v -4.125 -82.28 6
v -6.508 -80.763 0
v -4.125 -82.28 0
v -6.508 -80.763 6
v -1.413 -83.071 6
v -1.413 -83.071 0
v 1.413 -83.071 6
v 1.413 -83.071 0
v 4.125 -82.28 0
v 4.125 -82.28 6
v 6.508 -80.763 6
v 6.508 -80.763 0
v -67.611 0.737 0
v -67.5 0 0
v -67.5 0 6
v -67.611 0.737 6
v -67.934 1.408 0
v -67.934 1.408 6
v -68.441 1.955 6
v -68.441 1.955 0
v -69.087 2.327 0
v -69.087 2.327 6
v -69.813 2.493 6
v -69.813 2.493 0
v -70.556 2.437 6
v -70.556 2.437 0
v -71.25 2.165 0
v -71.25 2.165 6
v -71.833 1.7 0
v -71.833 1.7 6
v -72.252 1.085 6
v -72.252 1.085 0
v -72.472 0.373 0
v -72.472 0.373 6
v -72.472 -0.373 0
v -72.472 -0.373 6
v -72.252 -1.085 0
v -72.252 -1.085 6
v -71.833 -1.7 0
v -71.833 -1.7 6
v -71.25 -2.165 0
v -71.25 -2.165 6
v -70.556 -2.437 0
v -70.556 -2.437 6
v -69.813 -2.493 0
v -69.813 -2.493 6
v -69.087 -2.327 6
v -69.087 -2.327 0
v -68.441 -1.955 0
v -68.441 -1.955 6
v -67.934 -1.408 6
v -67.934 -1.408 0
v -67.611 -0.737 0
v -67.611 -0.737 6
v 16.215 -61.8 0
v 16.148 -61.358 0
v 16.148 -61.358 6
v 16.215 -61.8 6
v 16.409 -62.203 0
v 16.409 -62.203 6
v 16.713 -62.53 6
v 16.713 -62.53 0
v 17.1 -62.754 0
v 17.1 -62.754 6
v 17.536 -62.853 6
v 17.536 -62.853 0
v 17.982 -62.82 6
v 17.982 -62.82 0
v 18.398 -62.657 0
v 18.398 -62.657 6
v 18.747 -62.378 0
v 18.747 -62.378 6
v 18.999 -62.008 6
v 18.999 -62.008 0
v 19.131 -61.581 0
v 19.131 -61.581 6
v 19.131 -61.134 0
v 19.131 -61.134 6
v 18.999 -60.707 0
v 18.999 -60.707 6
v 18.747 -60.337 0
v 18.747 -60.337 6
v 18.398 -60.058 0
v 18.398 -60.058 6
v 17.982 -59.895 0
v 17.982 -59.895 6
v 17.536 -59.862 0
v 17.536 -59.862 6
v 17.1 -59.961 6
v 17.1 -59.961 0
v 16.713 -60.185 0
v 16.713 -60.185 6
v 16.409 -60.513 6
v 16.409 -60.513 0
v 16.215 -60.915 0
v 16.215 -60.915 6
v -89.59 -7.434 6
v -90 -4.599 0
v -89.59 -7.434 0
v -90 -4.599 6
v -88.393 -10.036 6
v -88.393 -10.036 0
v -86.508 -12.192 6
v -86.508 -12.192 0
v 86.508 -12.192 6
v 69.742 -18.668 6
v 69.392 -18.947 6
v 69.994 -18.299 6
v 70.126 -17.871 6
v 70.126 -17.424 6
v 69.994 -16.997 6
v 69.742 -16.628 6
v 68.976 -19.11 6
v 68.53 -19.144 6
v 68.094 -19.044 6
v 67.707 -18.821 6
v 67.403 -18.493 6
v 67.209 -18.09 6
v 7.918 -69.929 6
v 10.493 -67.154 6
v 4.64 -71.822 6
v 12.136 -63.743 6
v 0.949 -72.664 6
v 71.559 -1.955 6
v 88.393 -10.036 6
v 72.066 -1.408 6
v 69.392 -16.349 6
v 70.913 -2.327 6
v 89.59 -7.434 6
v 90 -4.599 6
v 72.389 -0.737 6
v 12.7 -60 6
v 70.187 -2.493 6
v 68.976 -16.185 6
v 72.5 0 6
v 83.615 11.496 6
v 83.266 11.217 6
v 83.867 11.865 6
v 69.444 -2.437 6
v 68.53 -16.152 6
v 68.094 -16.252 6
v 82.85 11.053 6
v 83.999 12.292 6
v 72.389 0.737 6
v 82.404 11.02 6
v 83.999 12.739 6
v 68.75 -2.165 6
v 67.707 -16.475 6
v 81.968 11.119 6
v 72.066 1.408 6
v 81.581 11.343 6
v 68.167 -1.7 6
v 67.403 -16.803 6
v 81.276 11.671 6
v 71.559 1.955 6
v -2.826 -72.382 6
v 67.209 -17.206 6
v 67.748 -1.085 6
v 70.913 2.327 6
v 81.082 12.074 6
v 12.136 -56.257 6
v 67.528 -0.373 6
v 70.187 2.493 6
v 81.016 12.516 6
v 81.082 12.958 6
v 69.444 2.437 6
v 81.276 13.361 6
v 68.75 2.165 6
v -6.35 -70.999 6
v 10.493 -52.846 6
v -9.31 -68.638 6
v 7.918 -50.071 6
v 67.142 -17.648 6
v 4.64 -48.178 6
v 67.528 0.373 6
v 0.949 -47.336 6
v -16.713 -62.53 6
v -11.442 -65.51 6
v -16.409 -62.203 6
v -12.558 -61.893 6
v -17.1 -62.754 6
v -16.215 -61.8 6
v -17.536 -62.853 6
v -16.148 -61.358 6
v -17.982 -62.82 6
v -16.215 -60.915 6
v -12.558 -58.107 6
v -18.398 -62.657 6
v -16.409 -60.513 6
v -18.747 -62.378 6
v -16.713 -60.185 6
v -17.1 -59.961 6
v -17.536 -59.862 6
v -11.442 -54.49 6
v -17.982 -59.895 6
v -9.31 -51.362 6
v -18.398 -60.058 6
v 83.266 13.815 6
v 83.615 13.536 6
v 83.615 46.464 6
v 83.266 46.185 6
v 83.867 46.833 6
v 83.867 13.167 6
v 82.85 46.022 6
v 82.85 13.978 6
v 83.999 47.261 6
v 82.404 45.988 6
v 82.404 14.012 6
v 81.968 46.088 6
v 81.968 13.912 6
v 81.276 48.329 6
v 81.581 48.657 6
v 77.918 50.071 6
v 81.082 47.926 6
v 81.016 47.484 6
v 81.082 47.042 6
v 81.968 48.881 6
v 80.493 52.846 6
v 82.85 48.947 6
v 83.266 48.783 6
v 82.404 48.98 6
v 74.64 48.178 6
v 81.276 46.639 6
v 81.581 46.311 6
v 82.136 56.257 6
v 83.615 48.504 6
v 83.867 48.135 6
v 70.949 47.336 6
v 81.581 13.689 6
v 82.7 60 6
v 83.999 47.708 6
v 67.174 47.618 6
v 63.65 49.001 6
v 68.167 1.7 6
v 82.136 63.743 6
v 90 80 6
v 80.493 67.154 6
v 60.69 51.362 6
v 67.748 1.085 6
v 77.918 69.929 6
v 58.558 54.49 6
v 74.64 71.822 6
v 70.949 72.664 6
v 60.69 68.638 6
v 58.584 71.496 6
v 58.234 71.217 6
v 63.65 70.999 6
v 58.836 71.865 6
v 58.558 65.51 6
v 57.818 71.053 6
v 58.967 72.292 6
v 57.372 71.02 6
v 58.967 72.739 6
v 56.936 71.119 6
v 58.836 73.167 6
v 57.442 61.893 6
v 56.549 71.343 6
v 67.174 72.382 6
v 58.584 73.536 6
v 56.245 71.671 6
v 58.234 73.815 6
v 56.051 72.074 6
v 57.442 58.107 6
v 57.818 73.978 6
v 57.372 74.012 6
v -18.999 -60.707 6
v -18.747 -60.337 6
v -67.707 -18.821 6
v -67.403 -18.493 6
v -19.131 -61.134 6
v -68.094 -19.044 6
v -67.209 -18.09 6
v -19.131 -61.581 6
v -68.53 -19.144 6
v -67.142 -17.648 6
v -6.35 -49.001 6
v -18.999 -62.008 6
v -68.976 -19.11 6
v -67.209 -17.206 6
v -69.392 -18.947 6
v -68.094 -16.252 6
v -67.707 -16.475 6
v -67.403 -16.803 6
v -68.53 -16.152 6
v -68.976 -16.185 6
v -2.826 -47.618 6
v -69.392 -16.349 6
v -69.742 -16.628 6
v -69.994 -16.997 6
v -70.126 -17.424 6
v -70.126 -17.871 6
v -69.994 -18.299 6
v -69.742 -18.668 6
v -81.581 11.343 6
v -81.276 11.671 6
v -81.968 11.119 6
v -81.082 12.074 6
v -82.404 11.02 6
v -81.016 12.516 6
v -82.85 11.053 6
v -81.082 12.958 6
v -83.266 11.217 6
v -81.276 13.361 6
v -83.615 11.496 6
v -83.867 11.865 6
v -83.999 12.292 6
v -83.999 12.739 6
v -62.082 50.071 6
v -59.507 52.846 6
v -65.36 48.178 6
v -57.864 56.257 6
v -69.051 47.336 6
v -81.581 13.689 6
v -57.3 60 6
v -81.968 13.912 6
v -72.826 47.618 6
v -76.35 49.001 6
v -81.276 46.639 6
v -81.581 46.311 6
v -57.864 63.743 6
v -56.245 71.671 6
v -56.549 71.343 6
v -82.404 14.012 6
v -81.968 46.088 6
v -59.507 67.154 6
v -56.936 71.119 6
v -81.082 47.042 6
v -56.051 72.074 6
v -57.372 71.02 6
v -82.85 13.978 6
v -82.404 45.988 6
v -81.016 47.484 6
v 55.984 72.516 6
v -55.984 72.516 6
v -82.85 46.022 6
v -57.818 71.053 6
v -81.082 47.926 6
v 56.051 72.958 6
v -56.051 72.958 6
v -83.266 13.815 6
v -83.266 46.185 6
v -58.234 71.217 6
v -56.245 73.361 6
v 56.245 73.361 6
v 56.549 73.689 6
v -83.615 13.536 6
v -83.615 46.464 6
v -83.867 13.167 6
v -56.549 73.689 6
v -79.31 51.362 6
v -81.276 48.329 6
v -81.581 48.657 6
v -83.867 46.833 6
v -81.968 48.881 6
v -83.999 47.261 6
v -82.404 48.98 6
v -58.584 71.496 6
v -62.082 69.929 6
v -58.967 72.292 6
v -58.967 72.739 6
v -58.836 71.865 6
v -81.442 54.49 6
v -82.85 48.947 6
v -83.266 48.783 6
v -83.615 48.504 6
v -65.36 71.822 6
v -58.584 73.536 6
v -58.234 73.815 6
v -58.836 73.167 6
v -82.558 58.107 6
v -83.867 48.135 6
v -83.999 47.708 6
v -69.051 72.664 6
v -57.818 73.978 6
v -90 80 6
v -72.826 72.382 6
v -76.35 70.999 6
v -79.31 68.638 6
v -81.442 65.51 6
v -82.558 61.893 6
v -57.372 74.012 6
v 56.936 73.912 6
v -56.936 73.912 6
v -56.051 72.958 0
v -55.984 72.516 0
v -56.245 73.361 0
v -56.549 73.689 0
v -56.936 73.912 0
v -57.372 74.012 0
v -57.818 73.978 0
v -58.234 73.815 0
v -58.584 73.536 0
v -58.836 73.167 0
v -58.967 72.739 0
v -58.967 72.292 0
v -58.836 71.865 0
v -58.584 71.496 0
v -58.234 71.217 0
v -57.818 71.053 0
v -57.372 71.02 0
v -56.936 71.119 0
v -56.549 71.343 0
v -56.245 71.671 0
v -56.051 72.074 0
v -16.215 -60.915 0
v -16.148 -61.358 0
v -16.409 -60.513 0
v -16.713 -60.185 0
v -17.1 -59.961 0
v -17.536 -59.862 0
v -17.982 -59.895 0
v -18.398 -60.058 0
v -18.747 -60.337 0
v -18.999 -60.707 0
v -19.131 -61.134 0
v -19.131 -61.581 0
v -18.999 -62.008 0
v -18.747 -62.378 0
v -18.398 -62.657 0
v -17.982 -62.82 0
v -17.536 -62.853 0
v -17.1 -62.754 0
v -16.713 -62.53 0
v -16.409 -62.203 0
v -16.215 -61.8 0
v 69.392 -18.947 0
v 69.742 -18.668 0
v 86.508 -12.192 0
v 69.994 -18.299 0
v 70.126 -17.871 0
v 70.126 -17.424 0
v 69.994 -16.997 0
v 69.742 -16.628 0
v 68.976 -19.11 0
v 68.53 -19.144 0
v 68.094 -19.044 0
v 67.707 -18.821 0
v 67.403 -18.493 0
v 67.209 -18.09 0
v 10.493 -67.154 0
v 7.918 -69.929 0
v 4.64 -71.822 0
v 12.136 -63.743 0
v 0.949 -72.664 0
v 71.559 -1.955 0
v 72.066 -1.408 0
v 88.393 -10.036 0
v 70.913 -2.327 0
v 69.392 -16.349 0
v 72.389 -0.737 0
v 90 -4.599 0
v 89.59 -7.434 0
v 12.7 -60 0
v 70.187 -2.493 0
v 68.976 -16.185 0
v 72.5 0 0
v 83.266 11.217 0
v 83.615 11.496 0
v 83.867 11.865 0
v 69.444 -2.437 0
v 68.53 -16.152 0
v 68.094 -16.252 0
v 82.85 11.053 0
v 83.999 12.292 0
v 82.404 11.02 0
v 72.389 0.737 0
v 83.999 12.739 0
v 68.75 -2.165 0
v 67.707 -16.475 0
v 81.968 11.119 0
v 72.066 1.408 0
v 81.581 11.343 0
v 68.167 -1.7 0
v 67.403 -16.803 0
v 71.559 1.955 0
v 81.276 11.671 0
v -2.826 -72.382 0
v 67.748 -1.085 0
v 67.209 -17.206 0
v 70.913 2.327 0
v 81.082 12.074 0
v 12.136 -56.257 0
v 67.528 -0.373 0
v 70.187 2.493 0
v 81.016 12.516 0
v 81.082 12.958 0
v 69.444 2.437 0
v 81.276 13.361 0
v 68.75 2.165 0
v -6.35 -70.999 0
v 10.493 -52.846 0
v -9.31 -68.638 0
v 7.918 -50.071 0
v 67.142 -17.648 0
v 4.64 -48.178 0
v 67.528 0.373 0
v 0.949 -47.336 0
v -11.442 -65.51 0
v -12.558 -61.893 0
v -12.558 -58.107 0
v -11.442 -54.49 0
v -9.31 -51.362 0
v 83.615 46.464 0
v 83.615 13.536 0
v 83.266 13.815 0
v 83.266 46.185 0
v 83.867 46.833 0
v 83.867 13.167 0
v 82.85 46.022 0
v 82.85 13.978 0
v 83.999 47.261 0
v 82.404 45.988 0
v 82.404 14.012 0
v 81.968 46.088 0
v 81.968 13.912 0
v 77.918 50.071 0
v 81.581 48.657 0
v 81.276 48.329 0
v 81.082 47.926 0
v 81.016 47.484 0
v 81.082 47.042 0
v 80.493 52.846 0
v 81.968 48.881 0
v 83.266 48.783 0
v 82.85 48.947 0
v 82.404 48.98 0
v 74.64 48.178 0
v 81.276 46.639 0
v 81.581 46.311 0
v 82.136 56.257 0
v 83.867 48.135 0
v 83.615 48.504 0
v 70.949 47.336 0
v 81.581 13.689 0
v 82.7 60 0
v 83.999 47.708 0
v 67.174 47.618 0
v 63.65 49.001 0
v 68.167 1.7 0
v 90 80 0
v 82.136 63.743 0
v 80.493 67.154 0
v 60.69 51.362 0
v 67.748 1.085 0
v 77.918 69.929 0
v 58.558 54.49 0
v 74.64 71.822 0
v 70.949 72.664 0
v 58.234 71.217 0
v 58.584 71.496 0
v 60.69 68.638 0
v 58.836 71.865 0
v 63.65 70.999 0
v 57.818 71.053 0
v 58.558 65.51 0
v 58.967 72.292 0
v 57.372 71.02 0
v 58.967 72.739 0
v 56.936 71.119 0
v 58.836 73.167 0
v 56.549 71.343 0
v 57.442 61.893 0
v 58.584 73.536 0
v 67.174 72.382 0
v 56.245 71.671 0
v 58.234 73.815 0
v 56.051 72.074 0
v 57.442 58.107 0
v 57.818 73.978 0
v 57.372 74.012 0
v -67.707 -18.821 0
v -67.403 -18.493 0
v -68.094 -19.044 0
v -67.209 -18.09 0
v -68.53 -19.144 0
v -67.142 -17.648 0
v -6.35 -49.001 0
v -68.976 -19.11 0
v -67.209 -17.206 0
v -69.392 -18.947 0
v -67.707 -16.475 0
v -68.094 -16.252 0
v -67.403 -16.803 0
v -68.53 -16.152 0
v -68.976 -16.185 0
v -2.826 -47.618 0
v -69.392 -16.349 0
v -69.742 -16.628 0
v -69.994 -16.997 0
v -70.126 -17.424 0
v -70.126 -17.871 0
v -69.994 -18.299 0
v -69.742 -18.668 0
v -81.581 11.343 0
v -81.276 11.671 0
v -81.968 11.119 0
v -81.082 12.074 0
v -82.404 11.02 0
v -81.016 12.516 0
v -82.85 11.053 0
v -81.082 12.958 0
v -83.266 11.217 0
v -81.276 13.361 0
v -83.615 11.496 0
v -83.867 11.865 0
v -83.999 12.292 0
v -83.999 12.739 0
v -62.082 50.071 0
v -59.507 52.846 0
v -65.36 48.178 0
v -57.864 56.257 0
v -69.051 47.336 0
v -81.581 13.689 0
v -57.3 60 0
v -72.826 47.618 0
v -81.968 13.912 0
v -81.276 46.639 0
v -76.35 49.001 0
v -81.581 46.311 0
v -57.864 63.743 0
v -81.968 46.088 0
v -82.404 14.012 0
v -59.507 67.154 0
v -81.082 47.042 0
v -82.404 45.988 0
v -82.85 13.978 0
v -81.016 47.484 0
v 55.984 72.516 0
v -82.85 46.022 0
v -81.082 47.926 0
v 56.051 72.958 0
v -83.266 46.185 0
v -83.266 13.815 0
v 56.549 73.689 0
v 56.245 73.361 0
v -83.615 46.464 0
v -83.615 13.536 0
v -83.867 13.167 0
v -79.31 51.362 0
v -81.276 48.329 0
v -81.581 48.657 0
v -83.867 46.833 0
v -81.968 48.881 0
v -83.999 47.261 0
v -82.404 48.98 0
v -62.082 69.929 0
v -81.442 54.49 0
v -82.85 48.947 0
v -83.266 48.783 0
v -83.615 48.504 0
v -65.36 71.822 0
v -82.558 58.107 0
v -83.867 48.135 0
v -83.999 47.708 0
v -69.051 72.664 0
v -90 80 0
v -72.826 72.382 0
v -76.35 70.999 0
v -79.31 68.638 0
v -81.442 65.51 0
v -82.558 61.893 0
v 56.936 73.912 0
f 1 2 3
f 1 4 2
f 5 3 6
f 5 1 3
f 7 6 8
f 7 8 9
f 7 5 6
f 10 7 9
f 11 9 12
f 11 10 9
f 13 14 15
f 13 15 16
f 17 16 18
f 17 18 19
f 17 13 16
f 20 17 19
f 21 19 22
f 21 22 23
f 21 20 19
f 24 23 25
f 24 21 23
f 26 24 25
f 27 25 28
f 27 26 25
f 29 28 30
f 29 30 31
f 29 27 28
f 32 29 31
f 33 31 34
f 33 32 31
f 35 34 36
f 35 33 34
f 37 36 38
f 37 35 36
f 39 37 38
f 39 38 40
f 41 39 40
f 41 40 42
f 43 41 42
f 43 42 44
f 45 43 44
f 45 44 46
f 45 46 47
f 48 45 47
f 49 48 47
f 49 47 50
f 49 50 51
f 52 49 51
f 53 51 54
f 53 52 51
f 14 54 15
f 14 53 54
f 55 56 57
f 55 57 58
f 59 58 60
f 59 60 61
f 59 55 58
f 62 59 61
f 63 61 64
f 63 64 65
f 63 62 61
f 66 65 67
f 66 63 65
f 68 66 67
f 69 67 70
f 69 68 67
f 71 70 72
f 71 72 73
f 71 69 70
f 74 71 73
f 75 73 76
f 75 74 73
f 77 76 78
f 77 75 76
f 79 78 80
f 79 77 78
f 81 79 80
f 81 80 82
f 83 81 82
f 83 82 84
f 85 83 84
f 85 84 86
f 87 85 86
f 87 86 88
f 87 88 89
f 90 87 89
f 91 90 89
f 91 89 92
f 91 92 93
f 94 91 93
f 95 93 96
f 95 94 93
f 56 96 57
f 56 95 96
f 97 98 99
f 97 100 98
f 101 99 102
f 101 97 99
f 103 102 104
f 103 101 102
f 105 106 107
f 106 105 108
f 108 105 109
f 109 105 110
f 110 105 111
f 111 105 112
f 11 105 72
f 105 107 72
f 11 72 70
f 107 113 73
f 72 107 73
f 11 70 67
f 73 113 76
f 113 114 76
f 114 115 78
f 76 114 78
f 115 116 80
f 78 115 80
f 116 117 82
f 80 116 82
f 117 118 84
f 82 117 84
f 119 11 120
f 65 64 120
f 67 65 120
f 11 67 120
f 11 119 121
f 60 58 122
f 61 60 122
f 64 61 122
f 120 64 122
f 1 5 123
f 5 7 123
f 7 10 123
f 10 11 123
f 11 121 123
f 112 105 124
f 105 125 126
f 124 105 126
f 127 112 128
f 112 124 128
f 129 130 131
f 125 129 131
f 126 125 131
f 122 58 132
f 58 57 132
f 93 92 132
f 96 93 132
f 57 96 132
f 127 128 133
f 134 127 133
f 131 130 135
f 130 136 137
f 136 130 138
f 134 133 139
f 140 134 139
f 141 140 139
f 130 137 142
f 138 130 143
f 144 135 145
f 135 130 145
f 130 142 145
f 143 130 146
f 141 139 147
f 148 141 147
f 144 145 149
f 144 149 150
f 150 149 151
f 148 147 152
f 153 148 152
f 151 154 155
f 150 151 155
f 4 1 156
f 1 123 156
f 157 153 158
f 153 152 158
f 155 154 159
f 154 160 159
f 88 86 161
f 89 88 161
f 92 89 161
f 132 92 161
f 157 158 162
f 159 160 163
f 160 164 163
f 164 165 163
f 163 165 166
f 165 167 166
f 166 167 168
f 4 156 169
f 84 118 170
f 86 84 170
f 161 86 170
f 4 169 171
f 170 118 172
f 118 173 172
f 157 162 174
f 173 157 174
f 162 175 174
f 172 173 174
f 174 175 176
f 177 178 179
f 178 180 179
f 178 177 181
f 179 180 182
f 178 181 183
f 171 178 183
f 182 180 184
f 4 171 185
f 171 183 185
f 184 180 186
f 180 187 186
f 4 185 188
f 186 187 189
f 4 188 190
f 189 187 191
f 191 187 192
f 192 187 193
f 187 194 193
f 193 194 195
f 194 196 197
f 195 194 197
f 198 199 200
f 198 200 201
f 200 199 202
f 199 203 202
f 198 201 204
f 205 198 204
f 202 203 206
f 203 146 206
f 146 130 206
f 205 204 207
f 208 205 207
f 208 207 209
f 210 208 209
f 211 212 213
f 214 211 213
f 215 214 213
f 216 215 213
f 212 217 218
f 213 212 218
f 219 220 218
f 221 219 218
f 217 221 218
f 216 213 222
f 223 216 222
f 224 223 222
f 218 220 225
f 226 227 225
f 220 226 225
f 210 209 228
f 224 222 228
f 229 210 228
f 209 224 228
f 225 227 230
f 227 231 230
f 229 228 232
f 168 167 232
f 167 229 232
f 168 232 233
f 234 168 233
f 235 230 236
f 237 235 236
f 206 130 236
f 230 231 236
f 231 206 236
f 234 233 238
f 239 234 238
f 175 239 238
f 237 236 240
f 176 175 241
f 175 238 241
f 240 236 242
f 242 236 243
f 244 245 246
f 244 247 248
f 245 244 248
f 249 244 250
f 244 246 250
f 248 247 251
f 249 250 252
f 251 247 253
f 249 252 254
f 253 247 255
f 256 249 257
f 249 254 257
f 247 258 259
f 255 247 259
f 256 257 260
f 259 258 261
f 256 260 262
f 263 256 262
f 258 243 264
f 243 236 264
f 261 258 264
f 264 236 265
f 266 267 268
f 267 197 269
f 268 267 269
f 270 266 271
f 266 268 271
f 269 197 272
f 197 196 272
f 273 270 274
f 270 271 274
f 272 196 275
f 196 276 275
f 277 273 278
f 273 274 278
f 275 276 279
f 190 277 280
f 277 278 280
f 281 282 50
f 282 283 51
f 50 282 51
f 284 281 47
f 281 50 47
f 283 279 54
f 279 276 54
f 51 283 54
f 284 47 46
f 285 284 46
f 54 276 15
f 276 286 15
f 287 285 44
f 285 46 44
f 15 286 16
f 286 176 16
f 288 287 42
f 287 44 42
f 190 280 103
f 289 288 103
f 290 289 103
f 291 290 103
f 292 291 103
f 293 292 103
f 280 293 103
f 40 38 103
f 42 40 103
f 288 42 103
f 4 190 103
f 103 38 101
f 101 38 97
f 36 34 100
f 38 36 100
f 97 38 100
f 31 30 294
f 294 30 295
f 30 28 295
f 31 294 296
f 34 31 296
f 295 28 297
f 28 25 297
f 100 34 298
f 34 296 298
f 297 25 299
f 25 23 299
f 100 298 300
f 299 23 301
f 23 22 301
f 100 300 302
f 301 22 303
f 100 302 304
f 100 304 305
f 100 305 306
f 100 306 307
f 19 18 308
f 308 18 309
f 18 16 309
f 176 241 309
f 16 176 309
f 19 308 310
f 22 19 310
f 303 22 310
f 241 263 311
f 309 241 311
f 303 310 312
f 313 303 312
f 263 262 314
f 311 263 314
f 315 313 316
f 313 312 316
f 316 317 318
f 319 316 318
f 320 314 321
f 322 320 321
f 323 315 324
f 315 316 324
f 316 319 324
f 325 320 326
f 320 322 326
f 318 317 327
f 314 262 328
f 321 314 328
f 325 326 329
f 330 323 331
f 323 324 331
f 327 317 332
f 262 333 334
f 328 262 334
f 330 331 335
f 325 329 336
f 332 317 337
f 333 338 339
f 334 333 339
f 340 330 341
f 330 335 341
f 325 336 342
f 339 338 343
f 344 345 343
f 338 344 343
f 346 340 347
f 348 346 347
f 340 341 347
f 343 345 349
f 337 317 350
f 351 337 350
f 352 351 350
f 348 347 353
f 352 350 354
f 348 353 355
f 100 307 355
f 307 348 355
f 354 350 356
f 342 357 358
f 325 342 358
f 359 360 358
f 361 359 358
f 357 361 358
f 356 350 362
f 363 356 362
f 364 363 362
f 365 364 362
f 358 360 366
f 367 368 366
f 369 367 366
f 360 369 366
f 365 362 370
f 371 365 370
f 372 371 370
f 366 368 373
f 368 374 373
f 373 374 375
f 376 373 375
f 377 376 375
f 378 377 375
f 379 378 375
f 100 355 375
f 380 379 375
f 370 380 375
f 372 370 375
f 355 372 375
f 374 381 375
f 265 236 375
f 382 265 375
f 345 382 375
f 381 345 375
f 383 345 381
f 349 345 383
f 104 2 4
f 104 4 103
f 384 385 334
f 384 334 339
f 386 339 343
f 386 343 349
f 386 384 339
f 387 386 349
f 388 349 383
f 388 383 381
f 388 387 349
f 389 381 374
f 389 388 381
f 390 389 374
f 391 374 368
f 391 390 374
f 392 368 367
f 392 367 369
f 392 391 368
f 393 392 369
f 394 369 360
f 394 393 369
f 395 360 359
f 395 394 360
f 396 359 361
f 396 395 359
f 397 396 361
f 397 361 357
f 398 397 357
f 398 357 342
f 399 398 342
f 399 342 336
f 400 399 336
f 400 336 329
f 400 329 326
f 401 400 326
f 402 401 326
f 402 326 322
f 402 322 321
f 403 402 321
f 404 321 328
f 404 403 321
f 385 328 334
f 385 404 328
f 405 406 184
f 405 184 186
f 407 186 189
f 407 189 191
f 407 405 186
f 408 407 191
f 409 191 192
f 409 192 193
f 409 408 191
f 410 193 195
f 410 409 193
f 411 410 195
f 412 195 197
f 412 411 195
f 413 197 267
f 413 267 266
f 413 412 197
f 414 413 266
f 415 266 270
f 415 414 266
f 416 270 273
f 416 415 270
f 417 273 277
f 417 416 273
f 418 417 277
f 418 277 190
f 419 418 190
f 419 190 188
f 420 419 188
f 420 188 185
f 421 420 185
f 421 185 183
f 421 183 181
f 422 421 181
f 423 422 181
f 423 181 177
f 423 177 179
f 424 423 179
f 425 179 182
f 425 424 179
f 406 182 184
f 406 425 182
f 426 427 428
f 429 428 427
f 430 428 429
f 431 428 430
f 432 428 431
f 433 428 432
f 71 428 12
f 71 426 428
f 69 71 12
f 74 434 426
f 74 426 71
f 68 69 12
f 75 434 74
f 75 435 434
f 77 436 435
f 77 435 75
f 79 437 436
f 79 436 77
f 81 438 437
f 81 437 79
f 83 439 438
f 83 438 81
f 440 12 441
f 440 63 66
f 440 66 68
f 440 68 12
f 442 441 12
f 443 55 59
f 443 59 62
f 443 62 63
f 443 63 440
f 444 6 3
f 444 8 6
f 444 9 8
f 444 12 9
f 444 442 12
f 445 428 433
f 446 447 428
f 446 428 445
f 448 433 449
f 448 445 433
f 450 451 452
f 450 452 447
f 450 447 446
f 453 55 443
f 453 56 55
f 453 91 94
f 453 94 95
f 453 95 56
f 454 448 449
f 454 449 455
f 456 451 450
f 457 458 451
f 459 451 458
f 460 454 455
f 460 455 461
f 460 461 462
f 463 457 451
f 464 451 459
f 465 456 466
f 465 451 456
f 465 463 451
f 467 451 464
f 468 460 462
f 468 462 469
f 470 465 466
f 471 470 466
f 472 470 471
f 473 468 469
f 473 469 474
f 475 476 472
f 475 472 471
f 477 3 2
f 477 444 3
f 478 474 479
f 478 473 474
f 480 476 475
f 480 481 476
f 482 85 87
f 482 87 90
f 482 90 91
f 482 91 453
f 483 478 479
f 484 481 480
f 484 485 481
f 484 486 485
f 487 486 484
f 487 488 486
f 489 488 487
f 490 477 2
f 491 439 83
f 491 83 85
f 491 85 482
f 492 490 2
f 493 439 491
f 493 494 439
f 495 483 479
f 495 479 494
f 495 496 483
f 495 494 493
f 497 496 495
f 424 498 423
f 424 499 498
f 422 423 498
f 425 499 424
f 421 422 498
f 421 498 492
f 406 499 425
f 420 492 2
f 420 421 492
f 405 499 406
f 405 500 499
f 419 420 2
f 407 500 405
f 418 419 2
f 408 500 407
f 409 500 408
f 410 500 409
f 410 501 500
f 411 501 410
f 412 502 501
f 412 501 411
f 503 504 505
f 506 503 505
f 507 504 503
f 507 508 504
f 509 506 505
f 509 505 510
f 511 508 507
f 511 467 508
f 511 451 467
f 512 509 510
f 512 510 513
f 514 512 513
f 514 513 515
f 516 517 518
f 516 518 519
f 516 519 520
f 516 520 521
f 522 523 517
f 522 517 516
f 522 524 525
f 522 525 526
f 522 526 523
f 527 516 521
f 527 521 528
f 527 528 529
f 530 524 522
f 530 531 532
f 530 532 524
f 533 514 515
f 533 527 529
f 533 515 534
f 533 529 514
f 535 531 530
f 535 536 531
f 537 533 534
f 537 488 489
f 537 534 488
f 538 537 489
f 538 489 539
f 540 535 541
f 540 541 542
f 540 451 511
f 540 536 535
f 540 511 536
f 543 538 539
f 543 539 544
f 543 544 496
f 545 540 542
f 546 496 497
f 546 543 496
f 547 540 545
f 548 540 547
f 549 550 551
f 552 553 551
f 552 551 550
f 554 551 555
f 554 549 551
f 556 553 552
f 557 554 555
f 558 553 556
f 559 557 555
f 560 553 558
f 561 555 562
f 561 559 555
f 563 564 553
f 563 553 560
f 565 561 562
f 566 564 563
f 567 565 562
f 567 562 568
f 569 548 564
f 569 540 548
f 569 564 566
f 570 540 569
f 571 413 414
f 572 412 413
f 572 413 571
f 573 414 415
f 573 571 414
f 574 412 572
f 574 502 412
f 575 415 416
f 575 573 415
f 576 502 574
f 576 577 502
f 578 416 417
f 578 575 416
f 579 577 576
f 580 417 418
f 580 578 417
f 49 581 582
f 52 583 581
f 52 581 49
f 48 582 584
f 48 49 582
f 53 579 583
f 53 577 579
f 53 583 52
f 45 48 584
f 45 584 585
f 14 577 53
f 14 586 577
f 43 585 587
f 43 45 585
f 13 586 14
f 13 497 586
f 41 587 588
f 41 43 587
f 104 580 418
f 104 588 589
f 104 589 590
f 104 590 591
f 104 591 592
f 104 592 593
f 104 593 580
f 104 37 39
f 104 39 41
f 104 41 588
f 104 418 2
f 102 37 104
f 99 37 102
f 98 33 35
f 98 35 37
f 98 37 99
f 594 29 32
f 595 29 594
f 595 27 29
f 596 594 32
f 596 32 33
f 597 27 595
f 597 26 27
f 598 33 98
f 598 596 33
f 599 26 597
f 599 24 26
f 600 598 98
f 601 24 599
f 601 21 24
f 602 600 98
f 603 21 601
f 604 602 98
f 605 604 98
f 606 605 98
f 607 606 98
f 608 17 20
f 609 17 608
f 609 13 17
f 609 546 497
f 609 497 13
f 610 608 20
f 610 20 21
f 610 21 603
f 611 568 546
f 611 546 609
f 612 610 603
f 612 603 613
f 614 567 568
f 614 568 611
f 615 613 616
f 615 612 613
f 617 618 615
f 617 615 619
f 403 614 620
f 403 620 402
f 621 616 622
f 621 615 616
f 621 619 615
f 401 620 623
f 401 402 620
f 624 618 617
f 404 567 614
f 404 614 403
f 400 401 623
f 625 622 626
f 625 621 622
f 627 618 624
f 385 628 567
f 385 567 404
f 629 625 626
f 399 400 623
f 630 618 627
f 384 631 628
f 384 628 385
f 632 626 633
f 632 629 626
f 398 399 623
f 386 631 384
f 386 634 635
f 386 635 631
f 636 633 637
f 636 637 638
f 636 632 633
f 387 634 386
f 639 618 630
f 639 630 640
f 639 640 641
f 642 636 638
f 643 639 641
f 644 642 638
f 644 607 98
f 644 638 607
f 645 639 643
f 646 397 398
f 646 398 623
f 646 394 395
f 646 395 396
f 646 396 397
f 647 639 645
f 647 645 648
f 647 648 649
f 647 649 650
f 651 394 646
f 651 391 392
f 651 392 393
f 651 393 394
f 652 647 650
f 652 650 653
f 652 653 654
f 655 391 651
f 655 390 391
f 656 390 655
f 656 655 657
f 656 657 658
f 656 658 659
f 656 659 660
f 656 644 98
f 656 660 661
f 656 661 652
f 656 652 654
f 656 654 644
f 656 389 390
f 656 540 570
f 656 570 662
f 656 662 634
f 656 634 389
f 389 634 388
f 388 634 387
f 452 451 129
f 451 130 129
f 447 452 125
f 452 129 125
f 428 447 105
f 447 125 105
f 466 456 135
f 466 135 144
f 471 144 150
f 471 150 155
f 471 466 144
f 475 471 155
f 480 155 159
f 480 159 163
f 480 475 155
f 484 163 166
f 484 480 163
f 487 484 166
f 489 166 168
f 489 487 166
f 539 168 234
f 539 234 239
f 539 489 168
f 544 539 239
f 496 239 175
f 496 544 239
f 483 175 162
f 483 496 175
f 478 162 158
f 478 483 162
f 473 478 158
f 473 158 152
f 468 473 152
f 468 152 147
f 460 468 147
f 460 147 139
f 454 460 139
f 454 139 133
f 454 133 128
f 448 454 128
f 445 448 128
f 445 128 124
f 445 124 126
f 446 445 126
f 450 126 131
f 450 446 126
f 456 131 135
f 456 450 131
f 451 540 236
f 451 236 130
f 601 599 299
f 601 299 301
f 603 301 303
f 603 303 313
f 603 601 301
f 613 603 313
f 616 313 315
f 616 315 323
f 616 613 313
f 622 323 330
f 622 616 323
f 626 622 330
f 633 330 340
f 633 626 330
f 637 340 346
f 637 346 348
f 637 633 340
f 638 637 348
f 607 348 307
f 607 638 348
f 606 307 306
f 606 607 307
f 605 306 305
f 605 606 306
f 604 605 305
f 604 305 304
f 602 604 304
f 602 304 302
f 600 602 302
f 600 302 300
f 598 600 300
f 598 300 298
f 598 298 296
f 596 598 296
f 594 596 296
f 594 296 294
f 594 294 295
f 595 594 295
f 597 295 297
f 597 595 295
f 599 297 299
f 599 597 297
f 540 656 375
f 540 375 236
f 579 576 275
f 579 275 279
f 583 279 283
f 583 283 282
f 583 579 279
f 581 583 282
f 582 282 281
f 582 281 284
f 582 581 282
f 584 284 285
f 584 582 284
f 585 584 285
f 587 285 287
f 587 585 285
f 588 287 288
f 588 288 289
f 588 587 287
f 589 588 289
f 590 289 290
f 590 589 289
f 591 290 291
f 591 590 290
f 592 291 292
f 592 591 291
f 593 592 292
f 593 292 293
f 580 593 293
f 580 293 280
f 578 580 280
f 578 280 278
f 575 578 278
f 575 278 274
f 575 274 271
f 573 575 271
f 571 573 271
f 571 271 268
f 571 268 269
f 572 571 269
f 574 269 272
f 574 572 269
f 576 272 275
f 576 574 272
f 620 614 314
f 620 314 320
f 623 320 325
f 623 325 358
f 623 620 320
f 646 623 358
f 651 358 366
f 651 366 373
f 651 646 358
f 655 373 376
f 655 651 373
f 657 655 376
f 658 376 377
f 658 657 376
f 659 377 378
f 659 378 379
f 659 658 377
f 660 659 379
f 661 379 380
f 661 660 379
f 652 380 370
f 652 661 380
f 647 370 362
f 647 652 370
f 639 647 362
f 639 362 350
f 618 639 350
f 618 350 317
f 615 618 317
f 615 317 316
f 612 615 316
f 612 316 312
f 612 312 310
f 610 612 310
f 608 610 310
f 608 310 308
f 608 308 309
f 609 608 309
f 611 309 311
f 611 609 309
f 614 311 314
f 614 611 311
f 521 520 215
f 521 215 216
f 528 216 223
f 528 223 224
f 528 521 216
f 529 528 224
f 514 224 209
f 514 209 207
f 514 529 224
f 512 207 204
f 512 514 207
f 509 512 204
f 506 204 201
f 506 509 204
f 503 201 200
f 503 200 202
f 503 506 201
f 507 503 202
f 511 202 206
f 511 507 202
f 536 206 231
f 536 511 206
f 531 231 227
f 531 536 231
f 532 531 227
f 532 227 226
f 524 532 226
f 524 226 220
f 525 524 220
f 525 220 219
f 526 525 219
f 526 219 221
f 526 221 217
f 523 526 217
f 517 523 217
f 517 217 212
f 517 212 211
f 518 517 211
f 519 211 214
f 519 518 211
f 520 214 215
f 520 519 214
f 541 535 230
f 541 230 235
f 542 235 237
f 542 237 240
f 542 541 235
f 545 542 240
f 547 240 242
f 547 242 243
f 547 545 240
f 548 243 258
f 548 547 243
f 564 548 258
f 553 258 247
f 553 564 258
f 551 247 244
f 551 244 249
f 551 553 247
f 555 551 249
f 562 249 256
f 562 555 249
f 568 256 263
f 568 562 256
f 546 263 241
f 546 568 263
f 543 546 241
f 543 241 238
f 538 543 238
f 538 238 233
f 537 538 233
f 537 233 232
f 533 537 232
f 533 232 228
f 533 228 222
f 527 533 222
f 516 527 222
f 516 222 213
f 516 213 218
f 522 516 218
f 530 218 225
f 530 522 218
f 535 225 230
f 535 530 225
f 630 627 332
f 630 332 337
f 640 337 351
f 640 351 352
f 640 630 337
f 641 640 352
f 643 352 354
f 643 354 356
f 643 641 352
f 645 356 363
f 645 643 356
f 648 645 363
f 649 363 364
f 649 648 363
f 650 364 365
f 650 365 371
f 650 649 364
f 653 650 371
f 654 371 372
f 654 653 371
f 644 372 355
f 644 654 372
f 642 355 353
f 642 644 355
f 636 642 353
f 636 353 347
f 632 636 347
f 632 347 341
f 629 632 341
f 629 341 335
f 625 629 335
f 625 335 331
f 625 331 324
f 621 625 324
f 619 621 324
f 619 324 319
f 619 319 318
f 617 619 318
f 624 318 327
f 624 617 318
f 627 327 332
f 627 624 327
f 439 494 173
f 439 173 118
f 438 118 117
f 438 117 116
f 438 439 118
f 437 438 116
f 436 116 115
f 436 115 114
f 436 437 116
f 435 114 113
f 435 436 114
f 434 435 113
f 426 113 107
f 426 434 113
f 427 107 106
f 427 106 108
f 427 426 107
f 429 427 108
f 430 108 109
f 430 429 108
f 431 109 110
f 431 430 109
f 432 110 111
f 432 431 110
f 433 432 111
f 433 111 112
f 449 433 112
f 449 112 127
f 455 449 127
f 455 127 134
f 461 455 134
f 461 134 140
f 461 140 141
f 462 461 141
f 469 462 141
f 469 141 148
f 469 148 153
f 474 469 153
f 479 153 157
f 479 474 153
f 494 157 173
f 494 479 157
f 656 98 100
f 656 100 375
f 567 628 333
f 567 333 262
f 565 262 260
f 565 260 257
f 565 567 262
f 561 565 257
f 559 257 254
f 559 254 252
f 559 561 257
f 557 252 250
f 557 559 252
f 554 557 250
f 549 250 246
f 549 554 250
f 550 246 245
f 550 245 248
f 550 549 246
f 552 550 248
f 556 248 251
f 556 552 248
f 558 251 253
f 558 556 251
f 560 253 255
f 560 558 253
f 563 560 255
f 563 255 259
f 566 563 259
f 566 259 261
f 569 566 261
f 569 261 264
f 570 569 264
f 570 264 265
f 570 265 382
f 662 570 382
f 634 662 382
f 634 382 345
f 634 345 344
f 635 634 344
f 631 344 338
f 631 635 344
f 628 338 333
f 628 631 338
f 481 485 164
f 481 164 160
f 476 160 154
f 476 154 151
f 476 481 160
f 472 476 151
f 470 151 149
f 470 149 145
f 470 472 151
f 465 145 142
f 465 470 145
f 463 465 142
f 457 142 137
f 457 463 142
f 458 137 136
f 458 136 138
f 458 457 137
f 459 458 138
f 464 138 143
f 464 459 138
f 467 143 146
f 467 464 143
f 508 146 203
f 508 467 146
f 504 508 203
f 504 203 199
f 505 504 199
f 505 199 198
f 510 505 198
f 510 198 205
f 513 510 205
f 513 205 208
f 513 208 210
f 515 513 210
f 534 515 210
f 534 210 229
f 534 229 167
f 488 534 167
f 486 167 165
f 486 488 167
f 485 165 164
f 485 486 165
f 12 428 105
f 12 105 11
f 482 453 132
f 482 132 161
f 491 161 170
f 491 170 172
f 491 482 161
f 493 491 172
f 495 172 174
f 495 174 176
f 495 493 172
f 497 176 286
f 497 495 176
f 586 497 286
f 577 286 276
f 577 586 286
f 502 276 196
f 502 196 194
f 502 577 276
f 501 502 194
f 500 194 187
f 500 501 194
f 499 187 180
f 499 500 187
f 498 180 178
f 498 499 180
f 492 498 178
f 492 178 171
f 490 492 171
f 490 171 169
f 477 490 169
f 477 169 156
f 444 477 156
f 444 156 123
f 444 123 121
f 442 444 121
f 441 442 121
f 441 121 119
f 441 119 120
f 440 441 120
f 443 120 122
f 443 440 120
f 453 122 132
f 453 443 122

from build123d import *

# Parameters (mm, degrees)
SKETCH1_R           = 12.7
SKETCH1_R_2         = 2.5
SKETCH1_R_3         = 1.5
BOSS_EXTRUDE1_DEPTH = 6
FILLET1_R           = 10


with BuildPart() as part:
    # Sketch1 → Boss-Extrude1 (new body)
    with BuildSketch(Plane.XY):
        Polygon((-90, 80), (90, 80), (90, -9.198698449), (0, -86.341555592), (-90, -9.198698449), align=None)
        with Locations((-70, 60)):
            Circle(SKETCH1_R, mode=Mode.SUBTRACT)
        with Locations((70, 60)):
            Circle(SKETCH1_R, mode=Mode.SUBTRACT)
        with Locations((-70, 0)):
            Circle(SKETCH1_R_2, mode=Mode.SUBTRACT)
        with Locations((70, 0)):
            Circle(SKETCH1_R_2, mode=Mode.SUBTRACT)
        with Locations((0, -60)):
            Circle(SKETCH1_R, mode=Mode.SUBTRACT)
        with Locations((-82.515790027, 47.484209973)):
            Circle(SKETCH1_R_3, mode=Mode.SUBTRACT)
        with Locations((-57.484209973, 72.515790027)):
            Circle(SKETCH1_R_3, mode=Mode.SUBTRACT)
        with Locations((-82.515790027, 12.515790027)):
            Circle(SKETCH1_R_3, mode=Mode.SUBTRACT)
        with Locations((-68.64247197, -17.647864393)):
            Circle(SKETCH1_R_3, mode=Mode.SUBTRACT)
        with Locations((-17.647864393, -61.35752803)):
            Circle(SKETCH1_R_3, mode=Mode.SUBTRACT)
        with Locations(Location((17.647864393, -61.35752803, 0), (0, 0, 180))):
            Circle(SKETCH1_R_3, mode=Mode.SUBTRACT)
        with Locations(Location((68.64247197, -17.647864393, 0), (0, 0, 180))):
            Circle(SKETCH1_R_3, mode=Mode.SUBTRACT)
        with Locations(Location((82.515790027, 12.515790027, 0), (0, 0, 180))):
            Circle(SKETCH1_R_3, mode=Mode.SUBTRACT)
        with Locations(Location((82.515790027, 47.484209973, 0), (0, 0, 180))):
            Circle(SKETCH1_R_3, mode=Mode.SUBTRACT)
        with Locations(Location((57.484209973, 72.515790027, 0), (0, 0, 180))):
            Circle(SKETCH1_R_3, mode=Mode.SUBTRACT)
    extrude(amount=BOSS_EXTRUDE1_DEPTH)

    # Fillet1
    fillet1_edges = [part.edges().sort_by_distance(p)[0] for p in [
        (90, -9.198698449, 3),
        (0, -86.341555592, 3),
        (-90, -9.198698449, 3),
    ]]
    fillet(fillet1_edges, radius=FILLET1_R)


solid = part.part
